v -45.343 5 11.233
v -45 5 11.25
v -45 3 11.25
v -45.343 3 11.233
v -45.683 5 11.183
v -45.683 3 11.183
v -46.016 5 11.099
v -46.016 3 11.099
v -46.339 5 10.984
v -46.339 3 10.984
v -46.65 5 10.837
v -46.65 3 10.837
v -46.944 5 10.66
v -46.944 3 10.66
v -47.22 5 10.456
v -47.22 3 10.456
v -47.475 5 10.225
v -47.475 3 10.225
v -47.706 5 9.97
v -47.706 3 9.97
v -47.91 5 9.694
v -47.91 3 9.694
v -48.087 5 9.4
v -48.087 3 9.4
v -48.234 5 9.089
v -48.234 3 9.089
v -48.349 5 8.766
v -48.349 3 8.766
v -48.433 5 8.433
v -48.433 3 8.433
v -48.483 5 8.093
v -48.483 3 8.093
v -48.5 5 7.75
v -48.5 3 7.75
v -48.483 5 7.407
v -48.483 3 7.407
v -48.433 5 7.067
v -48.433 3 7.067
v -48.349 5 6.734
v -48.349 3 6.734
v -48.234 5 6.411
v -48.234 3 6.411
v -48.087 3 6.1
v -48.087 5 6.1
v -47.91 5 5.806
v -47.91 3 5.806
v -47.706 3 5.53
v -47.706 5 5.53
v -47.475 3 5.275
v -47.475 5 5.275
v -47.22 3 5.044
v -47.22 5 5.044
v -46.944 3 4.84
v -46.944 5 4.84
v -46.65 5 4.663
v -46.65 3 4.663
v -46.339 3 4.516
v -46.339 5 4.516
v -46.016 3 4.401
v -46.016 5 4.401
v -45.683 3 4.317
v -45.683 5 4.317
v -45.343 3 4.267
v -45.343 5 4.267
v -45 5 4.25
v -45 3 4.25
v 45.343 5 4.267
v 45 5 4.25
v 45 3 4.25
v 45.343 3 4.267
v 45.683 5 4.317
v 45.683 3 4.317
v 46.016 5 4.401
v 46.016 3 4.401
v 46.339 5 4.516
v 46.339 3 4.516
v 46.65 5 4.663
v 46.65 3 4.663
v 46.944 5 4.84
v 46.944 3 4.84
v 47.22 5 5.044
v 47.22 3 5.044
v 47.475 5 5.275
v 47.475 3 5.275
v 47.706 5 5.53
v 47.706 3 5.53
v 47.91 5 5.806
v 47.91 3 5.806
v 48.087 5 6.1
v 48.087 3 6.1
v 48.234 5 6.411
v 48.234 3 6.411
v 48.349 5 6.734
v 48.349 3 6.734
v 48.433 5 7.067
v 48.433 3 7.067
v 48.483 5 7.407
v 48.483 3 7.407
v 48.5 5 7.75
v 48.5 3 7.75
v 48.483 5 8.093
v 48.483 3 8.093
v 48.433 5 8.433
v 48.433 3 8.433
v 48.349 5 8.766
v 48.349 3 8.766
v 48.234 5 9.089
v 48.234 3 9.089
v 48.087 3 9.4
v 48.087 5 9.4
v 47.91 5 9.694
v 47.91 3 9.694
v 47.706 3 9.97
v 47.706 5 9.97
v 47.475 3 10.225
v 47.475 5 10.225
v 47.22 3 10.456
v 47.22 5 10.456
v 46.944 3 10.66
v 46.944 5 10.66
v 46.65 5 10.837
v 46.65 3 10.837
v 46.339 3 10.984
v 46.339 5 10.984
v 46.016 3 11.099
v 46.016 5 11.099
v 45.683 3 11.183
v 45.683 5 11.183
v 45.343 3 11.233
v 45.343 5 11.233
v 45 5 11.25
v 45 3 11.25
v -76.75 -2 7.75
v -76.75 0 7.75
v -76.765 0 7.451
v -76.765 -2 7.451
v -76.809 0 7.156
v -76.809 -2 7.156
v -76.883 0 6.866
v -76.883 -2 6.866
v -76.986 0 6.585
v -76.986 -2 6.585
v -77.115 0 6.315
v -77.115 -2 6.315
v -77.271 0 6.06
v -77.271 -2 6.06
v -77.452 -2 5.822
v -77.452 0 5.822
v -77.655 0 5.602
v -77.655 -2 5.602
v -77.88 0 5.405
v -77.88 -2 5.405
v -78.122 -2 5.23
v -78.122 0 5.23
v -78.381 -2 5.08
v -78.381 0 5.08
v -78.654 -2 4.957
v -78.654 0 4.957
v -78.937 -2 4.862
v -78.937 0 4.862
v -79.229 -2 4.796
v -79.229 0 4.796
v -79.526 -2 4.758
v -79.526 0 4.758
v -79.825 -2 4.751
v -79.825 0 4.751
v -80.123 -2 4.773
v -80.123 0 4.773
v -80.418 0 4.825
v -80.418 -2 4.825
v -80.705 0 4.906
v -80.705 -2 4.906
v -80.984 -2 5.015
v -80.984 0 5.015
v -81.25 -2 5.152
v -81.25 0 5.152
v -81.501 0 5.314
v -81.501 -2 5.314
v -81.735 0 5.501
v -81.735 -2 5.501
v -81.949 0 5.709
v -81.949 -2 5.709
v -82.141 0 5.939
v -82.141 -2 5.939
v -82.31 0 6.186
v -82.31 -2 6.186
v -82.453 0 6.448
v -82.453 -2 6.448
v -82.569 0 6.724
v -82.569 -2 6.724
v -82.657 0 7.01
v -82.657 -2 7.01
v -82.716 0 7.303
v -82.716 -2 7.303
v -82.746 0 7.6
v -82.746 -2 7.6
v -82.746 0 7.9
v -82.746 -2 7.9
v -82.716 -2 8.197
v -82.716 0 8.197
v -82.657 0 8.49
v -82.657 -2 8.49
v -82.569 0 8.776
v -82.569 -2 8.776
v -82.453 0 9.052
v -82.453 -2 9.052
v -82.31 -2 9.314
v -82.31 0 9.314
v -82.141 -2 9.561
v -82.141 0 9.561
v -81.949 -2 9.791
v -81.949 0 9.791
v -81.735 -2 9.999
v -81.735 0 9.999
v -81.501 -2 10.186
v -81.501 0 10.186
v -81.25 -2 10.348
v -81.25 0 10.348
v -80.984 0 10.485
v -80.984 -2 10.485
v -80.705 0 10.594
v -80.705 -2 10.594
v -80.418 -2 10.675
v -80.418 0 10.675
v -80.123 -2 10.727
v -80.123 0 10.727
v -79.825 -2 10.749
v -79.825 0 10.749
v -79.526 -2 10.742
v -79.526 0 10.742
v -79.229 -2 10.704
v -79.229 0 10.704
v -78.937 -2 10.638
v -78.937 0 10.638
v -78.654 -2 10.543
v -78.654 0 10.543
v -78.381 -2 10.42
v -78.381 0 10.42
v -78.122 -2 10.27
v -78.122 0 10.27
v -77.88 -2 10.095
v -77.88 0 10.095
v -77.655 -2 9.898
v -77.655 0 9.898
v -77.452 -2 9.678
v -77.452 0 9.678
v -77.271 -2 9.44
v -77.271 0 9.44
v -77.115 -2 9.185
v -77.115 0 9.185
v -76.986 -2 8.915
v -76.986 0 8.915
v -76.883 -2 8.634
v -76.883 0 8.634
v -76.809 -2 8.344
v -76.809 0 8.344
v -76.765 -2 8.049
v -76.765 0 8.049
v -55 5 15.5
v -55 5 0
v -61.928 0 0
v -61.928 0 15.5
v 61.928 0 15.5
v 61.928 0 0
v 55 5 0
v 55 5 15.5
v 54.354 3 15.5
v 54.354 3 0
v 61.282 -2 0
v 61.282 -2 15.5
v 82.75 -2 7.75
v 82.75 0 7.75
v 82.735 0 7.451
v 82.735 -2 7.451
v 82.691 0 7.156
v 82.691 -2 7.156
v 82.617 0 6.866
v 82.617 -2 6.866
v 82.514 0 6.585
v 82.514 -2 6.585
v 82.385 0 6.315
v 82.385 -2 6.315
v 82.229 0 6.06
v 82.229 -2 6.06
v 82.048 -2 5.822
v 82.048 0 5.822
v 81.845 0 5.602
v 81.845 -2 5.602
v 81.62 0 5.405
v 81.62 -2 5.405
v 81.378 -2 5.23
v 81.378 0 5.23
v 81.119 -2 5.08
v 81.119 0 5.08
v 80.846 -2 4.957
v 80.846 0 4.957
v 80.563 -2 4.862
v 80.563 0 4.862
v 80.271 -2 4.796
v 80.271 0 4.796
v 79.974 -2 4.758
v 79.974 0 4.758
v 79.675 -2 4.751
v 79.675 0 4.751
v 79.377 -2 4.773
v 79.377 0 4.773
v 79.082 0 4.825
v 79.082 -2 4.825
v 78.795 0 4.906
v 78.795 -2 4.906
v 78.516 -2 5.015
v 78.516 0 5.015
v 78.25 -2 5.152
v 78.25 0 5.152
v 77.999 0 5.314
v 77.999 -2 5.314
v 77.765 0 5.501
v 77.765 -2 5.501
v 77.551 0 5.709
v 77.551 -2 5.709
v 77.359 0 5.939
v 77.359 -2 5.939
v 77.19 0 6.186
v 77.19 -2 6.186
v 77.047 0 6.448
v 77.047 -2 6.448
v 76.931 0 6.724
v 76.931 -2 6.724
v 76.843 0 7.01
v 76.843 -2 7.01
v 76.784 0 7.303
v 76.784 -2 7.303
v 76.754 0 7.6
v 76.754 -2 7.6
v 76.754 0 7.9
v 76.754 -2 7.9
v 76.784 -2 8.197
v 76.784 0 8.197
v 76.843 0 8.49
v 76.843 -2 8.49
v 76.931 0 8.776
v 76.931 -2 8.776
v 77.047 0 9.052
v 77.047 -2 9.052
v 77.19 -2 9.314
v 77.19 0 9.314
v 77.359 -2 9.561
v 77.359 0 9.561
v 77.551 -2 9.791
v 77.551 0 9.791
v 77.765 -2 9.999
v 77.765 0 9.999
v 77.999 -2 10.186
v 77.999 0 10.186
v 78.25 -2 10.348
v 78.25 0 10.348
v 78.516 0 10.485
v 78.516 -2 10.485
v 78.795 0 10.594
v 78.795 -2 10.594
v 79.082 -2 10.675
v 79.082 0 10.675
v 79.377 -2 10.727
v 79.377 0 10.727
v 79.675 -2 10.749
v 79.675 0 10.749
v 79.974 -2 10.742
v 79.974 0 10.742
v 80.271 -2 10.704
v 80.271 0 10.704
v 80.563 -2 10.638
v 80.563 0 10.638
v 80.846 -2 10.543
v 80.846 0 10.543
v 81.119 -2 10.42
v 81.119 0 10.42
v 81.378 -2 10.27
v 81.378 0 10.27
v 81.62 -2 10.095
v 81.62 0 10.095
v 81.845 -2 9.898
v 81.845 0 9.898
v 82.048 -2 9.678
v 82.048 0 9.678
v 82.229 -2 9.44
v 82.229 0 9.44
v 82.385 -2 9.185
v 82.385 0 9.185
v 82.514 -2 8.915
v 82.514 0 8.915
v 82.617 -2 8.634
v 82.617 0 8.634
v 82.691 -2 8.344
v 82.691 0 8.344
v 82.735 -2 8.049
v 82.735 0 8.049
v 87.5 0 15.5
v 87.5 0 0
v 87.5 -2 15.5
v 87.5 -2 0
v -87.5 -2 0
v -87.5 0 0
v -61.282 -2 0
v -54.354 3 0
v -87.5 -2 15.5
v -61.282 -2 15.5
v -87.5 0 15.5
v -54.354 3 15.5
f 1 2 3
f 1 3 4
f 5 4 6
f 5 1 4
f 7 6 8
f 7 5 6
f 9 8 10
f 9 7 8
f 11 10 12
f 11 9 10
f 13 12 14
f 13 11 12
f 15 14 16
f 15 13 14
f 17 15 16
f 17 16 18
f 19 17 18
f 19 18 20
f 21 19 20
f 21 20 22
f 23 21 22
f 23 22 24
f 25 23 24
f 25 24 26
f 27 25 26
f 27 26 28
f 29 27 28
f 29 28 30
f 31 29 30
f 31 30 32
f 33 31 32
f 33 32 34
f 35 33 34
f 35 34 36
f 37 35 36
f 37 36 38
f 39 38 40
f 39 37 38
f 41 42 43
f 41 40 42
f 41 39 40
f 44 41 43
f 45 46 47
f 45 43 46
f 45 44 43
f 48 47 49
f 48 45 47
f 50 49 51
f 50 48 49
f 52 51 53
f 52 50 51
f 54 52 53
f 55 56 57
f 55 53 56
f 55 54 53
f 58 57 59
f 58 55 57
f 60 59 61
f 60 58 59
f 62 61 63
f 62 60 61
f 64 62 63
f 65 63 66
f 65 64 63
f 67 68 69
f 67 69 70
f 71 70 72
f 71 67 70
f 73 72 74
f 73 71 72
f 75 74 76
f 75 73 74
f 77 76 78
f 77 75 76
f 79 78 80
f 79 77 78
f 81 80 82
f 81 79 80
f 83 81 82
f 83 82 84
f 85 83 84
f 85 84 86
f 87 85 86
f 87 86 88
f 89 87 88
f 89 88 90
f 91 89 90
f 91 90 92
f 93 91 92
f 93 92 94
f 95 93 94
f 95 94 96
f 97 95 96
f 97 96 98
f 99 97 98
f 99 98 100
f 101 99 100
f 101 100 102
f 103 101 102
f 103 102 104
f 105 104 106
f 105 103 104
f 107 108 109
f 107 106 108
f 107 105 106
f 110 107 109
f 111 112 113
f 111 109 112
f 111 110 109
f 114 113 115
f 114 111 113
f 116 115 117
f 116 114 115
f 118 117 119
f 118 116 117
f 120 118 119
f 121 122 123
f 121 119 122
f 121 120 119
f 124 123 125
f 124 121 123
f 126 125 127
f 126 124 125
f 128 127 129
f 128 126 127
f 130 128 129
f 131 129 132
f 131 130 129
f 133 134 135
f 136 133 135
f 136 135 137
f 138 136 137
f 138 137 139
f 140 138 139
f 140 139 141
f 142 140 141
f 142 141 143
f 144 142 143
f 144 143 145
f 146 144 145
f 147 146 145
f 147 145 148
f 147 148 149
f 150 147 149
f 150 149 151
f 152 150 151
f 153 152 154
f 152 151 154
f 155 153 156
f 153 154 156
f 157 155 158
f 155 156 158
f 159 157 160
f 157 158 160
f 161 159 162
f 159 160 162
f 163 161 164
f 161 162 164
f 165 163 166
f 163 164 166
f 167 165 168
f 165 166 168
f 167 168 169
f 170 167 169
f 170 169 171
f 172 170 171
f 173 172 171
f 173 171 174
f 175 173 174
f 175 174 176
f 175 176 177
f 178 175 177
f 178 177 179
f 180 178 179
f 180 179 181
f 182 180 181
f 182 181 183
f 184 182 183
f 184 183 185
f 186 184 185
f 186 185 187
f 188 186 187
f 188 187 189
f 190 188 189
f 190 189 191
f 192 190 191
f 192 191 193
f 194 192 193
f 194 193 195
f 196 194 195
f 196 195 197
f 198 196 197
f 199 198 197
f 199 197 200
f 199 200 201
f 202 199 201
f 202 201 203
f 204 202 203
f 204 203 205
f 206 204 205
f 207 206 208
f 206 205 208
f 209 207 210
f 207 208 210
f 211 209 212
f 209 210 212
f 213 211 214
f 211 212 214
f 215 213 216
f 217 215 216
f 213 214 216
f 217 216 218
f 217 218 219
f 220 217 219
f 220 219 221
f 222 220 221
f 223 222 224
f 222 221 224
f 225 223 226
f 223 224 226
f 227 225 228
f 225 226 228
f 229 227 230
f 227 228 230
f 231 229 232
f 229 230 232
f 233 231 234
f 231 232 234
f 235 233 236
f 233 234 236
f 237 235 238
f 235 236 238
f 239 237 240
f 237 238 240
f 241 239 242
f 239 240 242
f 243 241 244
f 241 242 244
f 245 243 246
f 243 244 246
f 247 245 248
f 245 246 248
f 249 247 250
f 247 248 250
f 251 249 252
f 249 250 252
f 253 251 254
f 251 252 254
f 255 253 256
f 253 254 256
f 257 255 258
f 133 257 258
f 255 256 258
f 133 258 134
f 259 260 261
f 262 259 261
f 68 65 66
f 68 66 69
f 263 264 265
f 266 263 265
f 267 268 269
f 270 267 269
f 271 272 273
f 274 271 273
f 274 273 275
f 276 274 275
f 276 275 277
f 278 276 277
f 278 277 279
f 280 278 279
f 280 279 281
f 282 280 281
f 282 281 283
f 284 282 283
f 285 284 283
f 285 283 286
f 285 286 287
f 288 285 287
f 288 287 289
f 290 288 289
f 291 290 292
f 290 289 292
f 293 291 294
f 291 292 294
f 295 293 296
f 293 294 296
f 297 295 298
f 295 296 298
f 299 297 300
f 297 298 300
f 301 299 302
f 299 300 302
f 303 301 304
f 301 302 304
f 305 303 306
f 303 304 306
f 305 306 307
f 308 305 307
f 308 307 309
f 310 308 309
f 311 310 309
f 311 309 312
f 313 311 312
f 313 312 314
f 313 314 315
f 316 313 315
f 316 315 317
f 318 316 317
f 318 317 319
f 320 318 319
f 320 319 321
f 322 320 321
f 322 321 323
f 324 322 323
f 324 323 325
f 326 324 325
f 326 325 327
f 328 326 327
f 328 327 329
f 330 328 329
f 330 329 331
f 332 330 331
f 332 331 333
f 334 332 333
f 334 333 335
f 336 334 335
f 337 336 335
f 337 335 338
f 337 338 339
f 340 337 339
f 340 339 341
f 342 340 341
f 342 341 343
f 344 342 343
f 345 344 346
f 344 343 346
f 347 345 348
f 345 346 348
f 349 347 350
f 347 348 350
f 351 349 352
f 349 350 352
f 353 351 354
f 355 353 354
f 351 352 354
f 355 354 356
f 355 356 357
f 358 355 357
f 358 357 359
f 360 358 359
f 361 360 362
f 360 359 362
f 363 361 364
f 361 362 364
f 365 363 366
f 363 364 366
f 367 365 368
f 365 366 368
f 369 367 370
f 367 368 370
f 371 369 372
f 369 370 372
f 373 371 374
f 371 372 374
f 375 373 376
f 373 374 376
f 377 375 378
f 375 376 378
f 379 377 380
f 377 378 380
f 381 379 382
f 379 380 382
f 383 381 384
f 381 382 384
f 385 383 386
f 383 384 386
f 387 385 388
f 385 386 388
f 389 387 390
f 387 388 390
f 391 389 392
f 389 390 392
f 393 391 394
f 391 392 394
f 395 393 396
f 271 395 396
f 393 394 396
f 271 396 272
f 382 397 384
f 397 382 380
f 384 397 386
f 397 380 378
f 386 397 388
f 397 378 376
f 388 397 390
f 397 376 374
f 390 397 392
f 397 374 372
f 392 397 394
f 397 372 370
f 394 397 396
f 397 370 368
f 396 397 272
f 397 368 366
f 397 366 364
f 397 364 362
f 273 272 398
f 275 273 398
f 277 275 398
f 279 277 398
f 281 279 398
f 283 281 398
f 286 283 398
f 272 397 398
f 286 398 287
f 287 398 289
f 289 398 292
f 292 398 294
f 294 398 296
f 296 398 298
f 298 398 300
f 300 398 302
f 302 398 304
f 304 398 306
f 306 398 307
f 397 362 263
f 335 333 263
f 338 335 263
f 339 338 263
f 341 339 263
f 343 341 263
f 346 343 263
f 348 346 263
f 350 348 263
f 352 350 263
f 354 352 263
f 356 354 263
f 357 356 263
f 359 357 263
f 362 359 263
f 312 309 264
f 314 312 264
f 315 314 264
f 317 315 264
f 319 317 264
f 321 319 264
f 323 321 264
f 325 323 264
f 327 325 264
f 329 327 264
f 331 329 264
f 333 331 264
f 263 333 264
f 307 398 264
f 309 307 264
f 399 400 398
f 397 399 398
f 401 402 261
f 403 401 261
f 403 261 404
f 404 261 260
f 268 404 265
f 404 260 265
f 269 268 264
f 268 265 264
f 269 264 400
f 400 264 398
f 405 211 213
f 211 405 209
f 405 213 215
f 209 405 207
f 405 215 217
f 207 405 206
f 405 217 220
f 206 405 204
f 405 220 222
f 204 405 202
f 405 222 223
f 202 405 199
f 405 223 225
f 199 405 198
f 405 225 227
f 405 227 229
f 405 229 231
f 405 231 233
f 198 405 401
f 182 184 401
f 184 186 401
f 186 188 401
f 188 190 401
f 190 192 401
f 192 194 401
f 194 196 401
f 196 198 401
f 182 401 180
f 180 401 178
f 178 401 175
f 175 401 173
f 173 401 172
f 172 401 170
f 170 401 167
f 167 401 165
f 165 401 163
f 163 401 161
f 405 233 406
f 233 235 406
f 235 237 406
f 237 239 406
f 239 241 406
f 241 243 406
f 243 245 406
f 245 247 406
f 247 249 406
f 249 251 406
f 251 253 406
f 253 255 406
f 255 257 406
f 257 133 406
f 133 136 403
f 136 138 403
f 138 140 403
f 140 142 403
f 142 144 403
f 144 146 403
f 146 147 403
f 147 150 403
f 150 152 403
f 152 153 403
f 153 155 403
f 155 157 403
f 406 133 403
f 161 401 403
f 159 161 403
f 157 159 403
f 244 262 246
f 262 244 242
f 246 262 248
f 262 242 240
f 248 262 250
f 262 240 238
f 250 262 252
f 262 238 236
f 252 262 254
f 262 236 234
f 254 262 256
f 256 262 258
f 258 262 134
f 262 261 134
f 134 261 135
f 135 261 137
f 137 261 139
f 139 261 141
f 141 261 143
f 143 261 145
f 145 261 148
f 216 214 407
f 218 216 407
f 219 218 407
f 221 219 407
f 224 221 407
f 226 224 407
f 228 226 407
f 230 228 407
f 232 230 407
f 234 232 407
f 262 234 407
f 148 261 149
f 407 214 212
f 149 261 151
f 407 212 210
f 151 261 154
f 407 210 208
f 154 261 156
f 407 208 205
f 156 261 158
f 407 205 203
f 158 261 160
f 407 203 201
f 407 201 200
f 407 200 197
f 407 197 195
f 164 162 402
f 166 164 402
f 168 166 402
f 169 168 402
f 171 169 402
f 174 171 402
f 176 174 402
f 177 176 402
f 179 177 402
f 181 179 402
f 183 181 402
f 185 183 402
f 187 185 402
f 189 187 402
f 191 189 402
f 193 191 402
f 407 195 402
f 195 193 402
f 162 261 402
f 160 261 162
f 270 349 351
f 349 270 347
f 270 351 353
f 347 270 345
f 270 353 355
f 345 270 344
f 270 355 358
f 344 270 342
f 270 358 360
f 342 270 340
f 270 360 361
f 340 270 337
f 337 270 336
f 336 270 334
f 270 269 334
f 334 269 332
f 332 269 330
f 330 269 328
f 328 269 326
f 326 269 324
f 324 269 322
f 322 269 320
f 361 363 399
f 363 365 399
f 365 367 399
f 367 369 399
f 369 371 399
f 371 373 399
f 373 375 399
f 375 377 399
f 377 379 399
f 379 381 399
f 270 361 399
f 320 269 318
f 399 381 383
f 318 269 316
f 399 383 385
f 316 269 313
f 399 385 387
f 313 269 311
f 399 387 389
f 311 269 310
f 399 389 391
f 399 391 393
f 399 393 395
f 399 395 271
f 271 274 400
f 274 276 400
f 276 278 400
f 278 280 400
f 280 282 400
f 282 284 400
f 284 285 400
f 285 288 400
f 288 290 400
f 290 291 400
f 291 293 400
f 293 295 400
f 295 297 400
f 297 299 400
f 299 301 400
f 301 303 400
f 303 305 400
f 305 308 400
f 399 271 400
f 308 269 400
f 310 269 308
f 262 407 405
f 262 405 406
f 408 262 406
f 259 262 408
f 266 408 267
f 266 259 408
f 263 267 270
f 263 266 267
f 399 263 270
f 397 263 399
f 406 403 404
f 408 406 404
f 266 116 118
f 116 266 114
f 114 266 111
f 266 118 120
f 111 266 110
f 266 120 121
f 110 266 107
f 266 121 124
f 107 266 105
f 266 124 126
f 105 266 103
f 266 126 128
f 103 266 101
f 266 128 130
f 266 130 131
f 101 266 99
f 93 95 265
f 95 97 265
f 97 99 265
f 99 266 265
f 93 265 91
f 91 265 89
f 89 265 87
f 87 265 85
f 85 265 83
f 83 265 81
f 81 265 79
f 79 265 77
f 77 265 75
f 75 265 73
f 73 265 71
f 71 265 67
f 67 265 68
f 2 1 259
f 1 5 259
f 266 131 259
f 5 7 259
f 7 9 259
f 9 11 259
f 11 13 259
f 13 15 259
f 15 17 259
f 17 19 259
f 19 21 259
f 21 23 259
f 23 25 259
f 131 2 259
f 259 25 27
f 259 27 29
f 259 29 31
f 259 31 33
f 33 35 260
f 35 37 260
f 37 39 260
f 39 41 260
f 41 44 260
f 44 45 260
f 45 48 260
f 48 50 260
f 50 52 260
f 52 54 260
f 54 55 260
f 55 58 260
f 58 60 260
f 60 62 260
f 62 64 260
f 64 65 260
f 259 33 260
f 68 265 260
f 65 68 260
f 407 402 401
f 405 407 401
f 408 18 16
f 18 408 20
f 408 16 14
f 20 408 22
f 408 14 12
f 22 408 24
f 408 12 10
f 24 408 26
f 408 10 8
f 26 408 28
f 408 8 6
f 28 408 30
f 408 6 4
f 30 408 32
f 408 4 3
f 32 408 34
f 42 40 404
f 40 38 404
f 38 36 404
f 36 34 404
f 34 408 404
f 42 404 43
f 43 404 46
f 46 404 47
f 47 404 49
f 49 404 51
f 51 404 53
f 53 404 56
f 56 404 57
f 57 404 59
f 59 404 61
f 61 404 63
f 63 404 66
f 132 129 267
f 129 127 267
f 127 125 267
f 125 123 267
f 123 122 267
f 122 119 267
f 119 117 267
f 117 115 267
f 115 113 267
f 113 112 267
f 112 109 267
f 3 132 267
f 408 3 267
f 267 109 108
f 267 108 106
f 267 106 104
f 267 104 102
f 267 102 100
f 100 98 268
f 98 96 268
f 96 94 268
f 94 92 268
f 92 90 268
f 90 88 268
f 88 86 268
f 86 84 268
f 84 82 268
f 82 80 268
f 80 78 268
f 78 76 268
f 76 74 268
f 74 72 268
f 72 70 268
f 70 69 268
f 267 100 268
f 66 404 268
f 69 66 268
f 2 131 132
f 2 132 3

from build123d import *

# Parameters (mm, degrees)
EXTRUDE_1_DEPTH     = 15.5
SKETCH_2_R          = 3
CUT_EXTRUDE_1_DEPTH = 10


with BuildPart() as part:
    # Эскиз1 → Вытянуть-Тонкостенный1 (new body)
    with BuildSketch(Plane.XY):
        Polygon((87.5, 0), (61.92820323, 0), (55, 5), (-55, 5), (-61.92820323, 0), (-87.5, 0), (-87.5, -2), (-61.281883024, -2), (-54.353679794, 3), (54.353679794, 3), (61.281883024, -2), (87.5, -2), align=None)
    extrude(amount=EXTRUDE_1_DEPTH)

    # Эскиз2 → Вырез-Вытянуть1 (cut)
    with BuildSketch(Plane(origin=(0, 5, 0), x_dir=(1, 0, 0), z_dir=(0, 1, 0))):
        with Locations((-79.75, -7.75)):
            Circle(SKETCH_2_R)
        with Locations((79.75, -7.75)):
            Circle(SKETCH_2_R)
        with BuildLine():
            Line((-45, -4.25), (45, -4.25))
            ThreePointArc((45, -4.25), (48.5, -7.75), (45, -11.25))
            Line((45, -11.25), (-45, -11.25))
            ThreePointArc((-45, -11.25), (-48.5, -7.75), (-45, -4.25))
        make_face()
    extrude(amount=-CUT_EXTRUDE_1_DEPTH, mode=Mode.SUBTRACT)


solid = part.part
